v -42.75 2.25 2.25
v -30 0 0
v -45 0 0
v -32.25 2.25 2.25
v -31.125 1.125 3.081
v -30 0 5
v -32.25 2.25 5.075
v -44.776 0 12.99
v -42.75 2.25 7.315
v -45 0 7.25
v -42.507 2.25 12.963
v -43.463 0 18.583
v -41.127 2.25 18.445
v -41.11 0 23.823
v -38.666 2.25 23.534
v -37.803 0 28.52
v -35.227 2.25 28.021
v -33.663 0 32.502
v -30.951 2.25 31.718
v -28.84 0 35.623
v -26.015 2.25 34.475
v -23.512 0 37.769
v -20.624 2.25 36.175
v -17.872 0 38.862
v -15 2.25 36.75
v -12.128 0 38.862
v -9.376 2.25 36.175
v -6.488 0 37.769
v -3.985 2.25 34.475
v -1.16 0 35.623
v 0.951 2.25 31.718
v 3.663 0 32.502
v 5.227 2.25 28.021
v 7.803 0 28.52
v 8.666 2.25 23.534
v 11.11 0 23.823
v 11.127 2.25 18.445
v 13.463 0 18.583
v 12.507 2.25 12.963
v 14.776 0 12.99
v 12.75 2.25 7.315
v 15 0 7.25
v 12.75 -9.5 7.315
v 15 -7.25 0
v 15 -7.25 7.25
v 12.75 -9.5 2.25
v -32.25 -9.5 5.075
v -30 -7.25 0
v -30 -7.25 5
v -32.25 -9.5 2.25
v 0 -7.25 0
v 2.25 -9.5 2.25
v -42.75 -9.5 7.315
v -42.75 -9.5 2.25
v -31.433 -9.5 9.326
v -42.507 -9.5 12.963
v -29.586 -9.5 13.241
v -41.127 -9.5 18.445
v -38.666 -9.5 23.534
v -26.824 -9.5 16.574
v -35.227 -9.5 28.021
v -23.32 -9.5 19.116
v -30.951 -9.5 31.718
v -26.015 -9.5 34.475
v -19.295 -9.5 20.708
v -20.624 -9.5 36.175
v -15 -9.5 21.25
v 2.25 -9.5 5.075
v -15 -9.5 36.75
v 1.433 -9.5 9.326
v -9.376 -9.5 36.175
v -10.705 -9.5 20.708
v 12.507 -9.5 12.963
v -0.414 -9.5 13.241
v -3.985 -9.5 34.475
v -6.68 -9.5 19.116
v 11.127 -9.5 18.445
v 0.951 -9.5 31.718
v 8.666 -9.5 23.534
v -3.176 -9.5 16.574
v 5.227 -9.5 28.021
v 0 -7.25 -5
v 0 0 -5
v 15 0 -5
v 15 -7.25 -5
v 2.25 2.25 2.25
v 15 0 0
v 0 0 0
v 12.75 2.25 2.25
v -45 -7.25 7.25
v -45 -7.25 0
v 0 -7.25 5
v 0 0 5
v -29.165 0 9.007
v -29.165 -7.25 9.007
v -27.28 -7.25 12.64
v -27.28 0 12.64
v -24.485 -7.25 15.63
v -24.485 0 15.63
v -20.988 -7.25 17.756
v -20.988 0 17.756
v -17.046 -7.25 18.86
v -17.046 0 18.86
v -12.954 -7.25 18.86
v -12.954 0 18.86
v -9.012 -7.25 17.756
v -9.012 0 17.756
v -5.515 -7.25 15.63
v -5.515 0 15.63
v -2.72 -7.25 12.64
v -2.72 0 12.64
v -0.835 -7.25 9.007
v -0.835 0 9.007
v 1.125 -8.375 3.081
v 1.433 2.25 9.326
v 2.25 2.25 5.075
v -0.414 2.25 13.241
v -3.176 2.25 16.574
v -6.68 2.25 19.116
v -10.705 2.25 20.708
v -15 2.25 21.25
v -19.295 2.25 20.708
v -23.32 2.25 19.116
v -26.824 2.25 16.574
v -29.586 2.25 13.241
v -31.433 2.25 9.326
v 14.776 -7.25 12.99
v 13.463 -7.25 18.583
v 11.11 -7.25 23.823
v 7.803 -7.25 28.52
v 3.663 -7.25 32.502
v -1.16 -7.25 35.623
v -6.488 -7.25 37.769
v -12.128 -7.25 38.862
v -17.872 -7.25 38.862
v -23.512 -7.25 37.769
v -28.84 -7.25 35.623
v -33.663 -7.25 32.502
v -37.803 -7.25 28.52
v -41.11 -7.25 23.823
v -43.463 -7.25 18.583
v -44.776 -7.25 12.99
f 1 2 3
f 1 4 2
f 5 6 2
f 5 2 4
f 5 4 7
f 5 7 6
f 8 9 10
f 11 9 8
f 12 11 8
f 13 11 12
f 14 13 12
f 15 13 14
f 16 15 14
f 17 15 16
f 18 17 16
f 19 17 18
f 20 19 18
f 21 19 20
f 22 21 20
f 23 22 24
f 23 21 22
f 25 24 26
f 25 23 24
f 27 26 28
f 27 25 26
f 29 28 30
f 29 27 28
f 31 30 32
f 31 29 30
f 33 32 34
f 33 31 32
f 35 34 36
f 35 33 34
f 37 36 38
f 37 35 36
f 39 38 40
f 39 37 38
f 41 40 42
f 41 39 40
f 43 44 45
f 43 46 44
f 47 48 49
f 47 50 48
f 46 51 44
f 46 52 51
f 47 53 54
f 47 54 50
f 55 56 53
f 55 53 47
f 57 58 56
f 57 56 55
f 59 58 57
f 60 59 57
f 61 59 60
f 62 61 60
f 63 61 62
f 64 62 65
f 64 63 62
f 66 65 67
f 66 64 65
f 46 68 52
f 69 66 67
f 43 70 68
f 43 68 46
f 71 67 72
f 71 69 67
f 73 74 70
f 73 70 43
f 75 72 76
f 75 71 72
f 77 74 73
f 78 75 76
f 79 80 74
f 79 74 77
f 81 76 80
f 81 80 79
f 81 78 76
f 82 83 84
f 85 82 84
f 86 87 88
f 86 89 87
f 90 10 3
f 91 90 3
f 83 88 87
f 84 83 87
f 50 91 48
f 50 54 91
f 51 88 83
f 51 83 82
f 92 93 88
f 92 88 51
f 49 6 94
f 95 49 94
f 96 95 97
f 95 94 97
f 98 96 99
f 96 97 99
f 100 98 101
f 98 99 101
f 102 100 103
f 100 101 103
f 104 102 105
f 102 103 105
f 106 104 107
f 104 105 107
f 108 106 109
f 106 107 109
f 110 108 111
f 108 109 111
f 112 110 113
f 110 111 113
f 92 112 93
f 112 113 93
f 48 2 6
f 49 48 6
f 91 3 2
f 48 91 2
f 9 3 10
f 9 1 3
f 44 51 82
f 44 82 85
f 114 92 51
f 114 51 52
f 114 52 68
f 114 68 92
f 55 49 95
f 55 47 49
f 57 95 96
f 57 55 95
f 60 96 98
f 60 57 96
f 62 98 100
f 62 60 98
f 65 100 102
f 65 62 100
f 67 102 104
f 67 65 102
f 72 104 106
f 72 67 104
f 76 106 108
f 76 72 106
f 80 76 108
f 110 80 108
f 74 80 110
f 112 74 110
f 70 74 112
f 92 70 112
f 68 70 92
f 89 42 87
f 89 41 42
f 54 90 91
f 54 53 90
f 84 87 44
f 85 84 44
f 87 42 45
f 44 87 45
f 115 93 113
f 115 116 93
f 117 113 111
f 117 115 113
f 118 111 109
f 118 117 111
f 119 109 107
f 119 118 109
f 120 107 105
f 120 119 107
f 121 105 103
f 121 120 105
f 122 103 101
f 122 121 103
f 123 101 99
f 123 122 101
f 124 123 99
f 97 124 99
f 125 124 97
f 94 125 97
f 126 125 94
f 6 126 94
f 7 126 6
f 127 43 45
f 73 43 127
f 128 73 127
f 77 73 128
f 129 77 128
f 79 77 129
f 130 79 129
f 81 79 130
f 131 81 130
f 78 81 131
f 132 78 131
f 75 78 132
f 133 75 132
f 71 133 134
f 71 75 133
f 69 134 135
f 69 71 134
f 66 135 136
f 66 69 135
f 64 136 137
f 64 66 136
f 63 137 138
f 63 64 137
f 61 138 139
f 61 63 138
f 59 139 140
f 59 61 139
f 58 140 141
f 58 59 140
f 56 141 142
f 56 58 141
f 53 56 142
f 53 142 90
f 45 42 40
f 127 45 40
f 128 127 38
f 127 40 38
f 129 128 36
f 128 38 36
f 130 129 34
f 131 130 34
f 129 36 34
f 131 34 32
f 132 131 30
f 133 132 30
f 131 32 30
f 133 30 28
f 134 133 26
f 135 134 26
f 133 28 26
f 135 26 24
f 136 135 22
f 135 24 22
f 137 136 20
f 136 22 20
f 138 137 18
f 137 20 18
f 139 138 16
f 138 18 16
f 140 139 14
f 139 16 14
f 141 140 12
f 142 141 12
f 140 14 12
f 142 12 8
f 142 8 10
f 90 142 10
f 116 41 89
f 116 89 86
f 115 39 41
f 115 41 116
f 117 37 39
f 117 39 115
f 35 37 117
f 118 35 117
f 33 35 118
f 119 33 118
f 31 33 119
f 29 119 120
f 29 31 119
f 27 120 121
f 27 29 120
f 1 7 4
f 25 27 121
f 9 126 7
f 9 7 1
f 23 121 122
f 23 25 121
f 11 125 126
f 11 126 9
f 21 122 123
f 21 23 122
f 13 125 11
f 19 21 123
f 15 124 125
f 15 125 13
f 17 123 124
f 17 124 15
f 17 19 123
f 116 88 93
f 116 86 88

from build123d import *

# Parameters (mm, degrees)
F1_DEPTH = 7.25
F3_DEPTH = 2.25
F3_TAPER = 45
F4_DEPTH = 2.25
F4_TAPER = 45
F5_DEPTH = 5


with BuildPart() as f1:
    # F0 (on Front) → F1 (new body)
    with BuildSketch(Plane.XZ):
        with BuildLine():
            Line((-45, 0), (-30, 0))
            Line((-30, 0), (-30, 5))
            ThreePointArc((-30, 5), (-15, 19), (0, 5))
            Line((0, 5), (0, 0))
            Line((0, 0), (15, 0))
            Line((15, 0), (15, 7.25))
            ThreePointArc((15, 7.25), (-15, 39), (-45, 7.25))
            Line((-45, 7.25), (-45, 0))
        make_face()
    extrude(amount=F1_DEPTH)

    # F2 (on face) → F3 (join)
    with BuildSketch(Plane.XZ.offset(7.25)):
        with BuildLine():
            ThreePointArc((15, 7.25), (-15, 39), (-45, 7.25))
            Line((-45, 7.25), (-45, 0))
            Line((-45, 0), (-30, 0))
            Line((-30, 0), (-30, 5))
            ThreePointArc((-30, 5), (-15, 19), (0, 5))
            Line((0, 5), (0, 0))
            Line((0, 0), (15, 0))
            Line((15, 0), (15, 7.25))
        make_face()
    extrude(amount=F3_DEPTH, taper=F3_TAPER)

    # F1_face1 (on face) → F4 (join)
    with BuildSketch(Plane(origin=(-15, 0, 19.7628829263), x_dir=(1, 0, 0), z_dir=(0, 1, 0))):
        with BuildLine():
            Line((-30, 19.7628829263), (-30, 12.5128829263))
            ThreePointArc((-30, 12.5128829263), (0, -19.2371170737), (30, 12.5128829263))
            Line((30, 12.5128829263), (30, 19.7628829263))
            Line((30, 19.7628829263), (15, 19.7628829263))
            Line((15, 19.7628829263), (15, 14.7628829263))
            ThreePointArc((15, 14.7628829263), (0, 0.7628829263), (-15, 14.7628829263))
            Line((-15, 14.7628829263), (-15, 19.7628829263))
            Line((-15, 19.7628829263), (-30, 19.7628829263))
        make_face()
    extrude(amount=F4_DEPTH, taper=F4_TAPER)

    # F5 (add): a face of the model
    f5_faces = [f1.faces().sort_by_distance(p)[0] for p in [
        (7.5, -3.625, 0),
    ]]
    extrude(f5_faces, amount=F5_DEPTH)


solid = f1.part
